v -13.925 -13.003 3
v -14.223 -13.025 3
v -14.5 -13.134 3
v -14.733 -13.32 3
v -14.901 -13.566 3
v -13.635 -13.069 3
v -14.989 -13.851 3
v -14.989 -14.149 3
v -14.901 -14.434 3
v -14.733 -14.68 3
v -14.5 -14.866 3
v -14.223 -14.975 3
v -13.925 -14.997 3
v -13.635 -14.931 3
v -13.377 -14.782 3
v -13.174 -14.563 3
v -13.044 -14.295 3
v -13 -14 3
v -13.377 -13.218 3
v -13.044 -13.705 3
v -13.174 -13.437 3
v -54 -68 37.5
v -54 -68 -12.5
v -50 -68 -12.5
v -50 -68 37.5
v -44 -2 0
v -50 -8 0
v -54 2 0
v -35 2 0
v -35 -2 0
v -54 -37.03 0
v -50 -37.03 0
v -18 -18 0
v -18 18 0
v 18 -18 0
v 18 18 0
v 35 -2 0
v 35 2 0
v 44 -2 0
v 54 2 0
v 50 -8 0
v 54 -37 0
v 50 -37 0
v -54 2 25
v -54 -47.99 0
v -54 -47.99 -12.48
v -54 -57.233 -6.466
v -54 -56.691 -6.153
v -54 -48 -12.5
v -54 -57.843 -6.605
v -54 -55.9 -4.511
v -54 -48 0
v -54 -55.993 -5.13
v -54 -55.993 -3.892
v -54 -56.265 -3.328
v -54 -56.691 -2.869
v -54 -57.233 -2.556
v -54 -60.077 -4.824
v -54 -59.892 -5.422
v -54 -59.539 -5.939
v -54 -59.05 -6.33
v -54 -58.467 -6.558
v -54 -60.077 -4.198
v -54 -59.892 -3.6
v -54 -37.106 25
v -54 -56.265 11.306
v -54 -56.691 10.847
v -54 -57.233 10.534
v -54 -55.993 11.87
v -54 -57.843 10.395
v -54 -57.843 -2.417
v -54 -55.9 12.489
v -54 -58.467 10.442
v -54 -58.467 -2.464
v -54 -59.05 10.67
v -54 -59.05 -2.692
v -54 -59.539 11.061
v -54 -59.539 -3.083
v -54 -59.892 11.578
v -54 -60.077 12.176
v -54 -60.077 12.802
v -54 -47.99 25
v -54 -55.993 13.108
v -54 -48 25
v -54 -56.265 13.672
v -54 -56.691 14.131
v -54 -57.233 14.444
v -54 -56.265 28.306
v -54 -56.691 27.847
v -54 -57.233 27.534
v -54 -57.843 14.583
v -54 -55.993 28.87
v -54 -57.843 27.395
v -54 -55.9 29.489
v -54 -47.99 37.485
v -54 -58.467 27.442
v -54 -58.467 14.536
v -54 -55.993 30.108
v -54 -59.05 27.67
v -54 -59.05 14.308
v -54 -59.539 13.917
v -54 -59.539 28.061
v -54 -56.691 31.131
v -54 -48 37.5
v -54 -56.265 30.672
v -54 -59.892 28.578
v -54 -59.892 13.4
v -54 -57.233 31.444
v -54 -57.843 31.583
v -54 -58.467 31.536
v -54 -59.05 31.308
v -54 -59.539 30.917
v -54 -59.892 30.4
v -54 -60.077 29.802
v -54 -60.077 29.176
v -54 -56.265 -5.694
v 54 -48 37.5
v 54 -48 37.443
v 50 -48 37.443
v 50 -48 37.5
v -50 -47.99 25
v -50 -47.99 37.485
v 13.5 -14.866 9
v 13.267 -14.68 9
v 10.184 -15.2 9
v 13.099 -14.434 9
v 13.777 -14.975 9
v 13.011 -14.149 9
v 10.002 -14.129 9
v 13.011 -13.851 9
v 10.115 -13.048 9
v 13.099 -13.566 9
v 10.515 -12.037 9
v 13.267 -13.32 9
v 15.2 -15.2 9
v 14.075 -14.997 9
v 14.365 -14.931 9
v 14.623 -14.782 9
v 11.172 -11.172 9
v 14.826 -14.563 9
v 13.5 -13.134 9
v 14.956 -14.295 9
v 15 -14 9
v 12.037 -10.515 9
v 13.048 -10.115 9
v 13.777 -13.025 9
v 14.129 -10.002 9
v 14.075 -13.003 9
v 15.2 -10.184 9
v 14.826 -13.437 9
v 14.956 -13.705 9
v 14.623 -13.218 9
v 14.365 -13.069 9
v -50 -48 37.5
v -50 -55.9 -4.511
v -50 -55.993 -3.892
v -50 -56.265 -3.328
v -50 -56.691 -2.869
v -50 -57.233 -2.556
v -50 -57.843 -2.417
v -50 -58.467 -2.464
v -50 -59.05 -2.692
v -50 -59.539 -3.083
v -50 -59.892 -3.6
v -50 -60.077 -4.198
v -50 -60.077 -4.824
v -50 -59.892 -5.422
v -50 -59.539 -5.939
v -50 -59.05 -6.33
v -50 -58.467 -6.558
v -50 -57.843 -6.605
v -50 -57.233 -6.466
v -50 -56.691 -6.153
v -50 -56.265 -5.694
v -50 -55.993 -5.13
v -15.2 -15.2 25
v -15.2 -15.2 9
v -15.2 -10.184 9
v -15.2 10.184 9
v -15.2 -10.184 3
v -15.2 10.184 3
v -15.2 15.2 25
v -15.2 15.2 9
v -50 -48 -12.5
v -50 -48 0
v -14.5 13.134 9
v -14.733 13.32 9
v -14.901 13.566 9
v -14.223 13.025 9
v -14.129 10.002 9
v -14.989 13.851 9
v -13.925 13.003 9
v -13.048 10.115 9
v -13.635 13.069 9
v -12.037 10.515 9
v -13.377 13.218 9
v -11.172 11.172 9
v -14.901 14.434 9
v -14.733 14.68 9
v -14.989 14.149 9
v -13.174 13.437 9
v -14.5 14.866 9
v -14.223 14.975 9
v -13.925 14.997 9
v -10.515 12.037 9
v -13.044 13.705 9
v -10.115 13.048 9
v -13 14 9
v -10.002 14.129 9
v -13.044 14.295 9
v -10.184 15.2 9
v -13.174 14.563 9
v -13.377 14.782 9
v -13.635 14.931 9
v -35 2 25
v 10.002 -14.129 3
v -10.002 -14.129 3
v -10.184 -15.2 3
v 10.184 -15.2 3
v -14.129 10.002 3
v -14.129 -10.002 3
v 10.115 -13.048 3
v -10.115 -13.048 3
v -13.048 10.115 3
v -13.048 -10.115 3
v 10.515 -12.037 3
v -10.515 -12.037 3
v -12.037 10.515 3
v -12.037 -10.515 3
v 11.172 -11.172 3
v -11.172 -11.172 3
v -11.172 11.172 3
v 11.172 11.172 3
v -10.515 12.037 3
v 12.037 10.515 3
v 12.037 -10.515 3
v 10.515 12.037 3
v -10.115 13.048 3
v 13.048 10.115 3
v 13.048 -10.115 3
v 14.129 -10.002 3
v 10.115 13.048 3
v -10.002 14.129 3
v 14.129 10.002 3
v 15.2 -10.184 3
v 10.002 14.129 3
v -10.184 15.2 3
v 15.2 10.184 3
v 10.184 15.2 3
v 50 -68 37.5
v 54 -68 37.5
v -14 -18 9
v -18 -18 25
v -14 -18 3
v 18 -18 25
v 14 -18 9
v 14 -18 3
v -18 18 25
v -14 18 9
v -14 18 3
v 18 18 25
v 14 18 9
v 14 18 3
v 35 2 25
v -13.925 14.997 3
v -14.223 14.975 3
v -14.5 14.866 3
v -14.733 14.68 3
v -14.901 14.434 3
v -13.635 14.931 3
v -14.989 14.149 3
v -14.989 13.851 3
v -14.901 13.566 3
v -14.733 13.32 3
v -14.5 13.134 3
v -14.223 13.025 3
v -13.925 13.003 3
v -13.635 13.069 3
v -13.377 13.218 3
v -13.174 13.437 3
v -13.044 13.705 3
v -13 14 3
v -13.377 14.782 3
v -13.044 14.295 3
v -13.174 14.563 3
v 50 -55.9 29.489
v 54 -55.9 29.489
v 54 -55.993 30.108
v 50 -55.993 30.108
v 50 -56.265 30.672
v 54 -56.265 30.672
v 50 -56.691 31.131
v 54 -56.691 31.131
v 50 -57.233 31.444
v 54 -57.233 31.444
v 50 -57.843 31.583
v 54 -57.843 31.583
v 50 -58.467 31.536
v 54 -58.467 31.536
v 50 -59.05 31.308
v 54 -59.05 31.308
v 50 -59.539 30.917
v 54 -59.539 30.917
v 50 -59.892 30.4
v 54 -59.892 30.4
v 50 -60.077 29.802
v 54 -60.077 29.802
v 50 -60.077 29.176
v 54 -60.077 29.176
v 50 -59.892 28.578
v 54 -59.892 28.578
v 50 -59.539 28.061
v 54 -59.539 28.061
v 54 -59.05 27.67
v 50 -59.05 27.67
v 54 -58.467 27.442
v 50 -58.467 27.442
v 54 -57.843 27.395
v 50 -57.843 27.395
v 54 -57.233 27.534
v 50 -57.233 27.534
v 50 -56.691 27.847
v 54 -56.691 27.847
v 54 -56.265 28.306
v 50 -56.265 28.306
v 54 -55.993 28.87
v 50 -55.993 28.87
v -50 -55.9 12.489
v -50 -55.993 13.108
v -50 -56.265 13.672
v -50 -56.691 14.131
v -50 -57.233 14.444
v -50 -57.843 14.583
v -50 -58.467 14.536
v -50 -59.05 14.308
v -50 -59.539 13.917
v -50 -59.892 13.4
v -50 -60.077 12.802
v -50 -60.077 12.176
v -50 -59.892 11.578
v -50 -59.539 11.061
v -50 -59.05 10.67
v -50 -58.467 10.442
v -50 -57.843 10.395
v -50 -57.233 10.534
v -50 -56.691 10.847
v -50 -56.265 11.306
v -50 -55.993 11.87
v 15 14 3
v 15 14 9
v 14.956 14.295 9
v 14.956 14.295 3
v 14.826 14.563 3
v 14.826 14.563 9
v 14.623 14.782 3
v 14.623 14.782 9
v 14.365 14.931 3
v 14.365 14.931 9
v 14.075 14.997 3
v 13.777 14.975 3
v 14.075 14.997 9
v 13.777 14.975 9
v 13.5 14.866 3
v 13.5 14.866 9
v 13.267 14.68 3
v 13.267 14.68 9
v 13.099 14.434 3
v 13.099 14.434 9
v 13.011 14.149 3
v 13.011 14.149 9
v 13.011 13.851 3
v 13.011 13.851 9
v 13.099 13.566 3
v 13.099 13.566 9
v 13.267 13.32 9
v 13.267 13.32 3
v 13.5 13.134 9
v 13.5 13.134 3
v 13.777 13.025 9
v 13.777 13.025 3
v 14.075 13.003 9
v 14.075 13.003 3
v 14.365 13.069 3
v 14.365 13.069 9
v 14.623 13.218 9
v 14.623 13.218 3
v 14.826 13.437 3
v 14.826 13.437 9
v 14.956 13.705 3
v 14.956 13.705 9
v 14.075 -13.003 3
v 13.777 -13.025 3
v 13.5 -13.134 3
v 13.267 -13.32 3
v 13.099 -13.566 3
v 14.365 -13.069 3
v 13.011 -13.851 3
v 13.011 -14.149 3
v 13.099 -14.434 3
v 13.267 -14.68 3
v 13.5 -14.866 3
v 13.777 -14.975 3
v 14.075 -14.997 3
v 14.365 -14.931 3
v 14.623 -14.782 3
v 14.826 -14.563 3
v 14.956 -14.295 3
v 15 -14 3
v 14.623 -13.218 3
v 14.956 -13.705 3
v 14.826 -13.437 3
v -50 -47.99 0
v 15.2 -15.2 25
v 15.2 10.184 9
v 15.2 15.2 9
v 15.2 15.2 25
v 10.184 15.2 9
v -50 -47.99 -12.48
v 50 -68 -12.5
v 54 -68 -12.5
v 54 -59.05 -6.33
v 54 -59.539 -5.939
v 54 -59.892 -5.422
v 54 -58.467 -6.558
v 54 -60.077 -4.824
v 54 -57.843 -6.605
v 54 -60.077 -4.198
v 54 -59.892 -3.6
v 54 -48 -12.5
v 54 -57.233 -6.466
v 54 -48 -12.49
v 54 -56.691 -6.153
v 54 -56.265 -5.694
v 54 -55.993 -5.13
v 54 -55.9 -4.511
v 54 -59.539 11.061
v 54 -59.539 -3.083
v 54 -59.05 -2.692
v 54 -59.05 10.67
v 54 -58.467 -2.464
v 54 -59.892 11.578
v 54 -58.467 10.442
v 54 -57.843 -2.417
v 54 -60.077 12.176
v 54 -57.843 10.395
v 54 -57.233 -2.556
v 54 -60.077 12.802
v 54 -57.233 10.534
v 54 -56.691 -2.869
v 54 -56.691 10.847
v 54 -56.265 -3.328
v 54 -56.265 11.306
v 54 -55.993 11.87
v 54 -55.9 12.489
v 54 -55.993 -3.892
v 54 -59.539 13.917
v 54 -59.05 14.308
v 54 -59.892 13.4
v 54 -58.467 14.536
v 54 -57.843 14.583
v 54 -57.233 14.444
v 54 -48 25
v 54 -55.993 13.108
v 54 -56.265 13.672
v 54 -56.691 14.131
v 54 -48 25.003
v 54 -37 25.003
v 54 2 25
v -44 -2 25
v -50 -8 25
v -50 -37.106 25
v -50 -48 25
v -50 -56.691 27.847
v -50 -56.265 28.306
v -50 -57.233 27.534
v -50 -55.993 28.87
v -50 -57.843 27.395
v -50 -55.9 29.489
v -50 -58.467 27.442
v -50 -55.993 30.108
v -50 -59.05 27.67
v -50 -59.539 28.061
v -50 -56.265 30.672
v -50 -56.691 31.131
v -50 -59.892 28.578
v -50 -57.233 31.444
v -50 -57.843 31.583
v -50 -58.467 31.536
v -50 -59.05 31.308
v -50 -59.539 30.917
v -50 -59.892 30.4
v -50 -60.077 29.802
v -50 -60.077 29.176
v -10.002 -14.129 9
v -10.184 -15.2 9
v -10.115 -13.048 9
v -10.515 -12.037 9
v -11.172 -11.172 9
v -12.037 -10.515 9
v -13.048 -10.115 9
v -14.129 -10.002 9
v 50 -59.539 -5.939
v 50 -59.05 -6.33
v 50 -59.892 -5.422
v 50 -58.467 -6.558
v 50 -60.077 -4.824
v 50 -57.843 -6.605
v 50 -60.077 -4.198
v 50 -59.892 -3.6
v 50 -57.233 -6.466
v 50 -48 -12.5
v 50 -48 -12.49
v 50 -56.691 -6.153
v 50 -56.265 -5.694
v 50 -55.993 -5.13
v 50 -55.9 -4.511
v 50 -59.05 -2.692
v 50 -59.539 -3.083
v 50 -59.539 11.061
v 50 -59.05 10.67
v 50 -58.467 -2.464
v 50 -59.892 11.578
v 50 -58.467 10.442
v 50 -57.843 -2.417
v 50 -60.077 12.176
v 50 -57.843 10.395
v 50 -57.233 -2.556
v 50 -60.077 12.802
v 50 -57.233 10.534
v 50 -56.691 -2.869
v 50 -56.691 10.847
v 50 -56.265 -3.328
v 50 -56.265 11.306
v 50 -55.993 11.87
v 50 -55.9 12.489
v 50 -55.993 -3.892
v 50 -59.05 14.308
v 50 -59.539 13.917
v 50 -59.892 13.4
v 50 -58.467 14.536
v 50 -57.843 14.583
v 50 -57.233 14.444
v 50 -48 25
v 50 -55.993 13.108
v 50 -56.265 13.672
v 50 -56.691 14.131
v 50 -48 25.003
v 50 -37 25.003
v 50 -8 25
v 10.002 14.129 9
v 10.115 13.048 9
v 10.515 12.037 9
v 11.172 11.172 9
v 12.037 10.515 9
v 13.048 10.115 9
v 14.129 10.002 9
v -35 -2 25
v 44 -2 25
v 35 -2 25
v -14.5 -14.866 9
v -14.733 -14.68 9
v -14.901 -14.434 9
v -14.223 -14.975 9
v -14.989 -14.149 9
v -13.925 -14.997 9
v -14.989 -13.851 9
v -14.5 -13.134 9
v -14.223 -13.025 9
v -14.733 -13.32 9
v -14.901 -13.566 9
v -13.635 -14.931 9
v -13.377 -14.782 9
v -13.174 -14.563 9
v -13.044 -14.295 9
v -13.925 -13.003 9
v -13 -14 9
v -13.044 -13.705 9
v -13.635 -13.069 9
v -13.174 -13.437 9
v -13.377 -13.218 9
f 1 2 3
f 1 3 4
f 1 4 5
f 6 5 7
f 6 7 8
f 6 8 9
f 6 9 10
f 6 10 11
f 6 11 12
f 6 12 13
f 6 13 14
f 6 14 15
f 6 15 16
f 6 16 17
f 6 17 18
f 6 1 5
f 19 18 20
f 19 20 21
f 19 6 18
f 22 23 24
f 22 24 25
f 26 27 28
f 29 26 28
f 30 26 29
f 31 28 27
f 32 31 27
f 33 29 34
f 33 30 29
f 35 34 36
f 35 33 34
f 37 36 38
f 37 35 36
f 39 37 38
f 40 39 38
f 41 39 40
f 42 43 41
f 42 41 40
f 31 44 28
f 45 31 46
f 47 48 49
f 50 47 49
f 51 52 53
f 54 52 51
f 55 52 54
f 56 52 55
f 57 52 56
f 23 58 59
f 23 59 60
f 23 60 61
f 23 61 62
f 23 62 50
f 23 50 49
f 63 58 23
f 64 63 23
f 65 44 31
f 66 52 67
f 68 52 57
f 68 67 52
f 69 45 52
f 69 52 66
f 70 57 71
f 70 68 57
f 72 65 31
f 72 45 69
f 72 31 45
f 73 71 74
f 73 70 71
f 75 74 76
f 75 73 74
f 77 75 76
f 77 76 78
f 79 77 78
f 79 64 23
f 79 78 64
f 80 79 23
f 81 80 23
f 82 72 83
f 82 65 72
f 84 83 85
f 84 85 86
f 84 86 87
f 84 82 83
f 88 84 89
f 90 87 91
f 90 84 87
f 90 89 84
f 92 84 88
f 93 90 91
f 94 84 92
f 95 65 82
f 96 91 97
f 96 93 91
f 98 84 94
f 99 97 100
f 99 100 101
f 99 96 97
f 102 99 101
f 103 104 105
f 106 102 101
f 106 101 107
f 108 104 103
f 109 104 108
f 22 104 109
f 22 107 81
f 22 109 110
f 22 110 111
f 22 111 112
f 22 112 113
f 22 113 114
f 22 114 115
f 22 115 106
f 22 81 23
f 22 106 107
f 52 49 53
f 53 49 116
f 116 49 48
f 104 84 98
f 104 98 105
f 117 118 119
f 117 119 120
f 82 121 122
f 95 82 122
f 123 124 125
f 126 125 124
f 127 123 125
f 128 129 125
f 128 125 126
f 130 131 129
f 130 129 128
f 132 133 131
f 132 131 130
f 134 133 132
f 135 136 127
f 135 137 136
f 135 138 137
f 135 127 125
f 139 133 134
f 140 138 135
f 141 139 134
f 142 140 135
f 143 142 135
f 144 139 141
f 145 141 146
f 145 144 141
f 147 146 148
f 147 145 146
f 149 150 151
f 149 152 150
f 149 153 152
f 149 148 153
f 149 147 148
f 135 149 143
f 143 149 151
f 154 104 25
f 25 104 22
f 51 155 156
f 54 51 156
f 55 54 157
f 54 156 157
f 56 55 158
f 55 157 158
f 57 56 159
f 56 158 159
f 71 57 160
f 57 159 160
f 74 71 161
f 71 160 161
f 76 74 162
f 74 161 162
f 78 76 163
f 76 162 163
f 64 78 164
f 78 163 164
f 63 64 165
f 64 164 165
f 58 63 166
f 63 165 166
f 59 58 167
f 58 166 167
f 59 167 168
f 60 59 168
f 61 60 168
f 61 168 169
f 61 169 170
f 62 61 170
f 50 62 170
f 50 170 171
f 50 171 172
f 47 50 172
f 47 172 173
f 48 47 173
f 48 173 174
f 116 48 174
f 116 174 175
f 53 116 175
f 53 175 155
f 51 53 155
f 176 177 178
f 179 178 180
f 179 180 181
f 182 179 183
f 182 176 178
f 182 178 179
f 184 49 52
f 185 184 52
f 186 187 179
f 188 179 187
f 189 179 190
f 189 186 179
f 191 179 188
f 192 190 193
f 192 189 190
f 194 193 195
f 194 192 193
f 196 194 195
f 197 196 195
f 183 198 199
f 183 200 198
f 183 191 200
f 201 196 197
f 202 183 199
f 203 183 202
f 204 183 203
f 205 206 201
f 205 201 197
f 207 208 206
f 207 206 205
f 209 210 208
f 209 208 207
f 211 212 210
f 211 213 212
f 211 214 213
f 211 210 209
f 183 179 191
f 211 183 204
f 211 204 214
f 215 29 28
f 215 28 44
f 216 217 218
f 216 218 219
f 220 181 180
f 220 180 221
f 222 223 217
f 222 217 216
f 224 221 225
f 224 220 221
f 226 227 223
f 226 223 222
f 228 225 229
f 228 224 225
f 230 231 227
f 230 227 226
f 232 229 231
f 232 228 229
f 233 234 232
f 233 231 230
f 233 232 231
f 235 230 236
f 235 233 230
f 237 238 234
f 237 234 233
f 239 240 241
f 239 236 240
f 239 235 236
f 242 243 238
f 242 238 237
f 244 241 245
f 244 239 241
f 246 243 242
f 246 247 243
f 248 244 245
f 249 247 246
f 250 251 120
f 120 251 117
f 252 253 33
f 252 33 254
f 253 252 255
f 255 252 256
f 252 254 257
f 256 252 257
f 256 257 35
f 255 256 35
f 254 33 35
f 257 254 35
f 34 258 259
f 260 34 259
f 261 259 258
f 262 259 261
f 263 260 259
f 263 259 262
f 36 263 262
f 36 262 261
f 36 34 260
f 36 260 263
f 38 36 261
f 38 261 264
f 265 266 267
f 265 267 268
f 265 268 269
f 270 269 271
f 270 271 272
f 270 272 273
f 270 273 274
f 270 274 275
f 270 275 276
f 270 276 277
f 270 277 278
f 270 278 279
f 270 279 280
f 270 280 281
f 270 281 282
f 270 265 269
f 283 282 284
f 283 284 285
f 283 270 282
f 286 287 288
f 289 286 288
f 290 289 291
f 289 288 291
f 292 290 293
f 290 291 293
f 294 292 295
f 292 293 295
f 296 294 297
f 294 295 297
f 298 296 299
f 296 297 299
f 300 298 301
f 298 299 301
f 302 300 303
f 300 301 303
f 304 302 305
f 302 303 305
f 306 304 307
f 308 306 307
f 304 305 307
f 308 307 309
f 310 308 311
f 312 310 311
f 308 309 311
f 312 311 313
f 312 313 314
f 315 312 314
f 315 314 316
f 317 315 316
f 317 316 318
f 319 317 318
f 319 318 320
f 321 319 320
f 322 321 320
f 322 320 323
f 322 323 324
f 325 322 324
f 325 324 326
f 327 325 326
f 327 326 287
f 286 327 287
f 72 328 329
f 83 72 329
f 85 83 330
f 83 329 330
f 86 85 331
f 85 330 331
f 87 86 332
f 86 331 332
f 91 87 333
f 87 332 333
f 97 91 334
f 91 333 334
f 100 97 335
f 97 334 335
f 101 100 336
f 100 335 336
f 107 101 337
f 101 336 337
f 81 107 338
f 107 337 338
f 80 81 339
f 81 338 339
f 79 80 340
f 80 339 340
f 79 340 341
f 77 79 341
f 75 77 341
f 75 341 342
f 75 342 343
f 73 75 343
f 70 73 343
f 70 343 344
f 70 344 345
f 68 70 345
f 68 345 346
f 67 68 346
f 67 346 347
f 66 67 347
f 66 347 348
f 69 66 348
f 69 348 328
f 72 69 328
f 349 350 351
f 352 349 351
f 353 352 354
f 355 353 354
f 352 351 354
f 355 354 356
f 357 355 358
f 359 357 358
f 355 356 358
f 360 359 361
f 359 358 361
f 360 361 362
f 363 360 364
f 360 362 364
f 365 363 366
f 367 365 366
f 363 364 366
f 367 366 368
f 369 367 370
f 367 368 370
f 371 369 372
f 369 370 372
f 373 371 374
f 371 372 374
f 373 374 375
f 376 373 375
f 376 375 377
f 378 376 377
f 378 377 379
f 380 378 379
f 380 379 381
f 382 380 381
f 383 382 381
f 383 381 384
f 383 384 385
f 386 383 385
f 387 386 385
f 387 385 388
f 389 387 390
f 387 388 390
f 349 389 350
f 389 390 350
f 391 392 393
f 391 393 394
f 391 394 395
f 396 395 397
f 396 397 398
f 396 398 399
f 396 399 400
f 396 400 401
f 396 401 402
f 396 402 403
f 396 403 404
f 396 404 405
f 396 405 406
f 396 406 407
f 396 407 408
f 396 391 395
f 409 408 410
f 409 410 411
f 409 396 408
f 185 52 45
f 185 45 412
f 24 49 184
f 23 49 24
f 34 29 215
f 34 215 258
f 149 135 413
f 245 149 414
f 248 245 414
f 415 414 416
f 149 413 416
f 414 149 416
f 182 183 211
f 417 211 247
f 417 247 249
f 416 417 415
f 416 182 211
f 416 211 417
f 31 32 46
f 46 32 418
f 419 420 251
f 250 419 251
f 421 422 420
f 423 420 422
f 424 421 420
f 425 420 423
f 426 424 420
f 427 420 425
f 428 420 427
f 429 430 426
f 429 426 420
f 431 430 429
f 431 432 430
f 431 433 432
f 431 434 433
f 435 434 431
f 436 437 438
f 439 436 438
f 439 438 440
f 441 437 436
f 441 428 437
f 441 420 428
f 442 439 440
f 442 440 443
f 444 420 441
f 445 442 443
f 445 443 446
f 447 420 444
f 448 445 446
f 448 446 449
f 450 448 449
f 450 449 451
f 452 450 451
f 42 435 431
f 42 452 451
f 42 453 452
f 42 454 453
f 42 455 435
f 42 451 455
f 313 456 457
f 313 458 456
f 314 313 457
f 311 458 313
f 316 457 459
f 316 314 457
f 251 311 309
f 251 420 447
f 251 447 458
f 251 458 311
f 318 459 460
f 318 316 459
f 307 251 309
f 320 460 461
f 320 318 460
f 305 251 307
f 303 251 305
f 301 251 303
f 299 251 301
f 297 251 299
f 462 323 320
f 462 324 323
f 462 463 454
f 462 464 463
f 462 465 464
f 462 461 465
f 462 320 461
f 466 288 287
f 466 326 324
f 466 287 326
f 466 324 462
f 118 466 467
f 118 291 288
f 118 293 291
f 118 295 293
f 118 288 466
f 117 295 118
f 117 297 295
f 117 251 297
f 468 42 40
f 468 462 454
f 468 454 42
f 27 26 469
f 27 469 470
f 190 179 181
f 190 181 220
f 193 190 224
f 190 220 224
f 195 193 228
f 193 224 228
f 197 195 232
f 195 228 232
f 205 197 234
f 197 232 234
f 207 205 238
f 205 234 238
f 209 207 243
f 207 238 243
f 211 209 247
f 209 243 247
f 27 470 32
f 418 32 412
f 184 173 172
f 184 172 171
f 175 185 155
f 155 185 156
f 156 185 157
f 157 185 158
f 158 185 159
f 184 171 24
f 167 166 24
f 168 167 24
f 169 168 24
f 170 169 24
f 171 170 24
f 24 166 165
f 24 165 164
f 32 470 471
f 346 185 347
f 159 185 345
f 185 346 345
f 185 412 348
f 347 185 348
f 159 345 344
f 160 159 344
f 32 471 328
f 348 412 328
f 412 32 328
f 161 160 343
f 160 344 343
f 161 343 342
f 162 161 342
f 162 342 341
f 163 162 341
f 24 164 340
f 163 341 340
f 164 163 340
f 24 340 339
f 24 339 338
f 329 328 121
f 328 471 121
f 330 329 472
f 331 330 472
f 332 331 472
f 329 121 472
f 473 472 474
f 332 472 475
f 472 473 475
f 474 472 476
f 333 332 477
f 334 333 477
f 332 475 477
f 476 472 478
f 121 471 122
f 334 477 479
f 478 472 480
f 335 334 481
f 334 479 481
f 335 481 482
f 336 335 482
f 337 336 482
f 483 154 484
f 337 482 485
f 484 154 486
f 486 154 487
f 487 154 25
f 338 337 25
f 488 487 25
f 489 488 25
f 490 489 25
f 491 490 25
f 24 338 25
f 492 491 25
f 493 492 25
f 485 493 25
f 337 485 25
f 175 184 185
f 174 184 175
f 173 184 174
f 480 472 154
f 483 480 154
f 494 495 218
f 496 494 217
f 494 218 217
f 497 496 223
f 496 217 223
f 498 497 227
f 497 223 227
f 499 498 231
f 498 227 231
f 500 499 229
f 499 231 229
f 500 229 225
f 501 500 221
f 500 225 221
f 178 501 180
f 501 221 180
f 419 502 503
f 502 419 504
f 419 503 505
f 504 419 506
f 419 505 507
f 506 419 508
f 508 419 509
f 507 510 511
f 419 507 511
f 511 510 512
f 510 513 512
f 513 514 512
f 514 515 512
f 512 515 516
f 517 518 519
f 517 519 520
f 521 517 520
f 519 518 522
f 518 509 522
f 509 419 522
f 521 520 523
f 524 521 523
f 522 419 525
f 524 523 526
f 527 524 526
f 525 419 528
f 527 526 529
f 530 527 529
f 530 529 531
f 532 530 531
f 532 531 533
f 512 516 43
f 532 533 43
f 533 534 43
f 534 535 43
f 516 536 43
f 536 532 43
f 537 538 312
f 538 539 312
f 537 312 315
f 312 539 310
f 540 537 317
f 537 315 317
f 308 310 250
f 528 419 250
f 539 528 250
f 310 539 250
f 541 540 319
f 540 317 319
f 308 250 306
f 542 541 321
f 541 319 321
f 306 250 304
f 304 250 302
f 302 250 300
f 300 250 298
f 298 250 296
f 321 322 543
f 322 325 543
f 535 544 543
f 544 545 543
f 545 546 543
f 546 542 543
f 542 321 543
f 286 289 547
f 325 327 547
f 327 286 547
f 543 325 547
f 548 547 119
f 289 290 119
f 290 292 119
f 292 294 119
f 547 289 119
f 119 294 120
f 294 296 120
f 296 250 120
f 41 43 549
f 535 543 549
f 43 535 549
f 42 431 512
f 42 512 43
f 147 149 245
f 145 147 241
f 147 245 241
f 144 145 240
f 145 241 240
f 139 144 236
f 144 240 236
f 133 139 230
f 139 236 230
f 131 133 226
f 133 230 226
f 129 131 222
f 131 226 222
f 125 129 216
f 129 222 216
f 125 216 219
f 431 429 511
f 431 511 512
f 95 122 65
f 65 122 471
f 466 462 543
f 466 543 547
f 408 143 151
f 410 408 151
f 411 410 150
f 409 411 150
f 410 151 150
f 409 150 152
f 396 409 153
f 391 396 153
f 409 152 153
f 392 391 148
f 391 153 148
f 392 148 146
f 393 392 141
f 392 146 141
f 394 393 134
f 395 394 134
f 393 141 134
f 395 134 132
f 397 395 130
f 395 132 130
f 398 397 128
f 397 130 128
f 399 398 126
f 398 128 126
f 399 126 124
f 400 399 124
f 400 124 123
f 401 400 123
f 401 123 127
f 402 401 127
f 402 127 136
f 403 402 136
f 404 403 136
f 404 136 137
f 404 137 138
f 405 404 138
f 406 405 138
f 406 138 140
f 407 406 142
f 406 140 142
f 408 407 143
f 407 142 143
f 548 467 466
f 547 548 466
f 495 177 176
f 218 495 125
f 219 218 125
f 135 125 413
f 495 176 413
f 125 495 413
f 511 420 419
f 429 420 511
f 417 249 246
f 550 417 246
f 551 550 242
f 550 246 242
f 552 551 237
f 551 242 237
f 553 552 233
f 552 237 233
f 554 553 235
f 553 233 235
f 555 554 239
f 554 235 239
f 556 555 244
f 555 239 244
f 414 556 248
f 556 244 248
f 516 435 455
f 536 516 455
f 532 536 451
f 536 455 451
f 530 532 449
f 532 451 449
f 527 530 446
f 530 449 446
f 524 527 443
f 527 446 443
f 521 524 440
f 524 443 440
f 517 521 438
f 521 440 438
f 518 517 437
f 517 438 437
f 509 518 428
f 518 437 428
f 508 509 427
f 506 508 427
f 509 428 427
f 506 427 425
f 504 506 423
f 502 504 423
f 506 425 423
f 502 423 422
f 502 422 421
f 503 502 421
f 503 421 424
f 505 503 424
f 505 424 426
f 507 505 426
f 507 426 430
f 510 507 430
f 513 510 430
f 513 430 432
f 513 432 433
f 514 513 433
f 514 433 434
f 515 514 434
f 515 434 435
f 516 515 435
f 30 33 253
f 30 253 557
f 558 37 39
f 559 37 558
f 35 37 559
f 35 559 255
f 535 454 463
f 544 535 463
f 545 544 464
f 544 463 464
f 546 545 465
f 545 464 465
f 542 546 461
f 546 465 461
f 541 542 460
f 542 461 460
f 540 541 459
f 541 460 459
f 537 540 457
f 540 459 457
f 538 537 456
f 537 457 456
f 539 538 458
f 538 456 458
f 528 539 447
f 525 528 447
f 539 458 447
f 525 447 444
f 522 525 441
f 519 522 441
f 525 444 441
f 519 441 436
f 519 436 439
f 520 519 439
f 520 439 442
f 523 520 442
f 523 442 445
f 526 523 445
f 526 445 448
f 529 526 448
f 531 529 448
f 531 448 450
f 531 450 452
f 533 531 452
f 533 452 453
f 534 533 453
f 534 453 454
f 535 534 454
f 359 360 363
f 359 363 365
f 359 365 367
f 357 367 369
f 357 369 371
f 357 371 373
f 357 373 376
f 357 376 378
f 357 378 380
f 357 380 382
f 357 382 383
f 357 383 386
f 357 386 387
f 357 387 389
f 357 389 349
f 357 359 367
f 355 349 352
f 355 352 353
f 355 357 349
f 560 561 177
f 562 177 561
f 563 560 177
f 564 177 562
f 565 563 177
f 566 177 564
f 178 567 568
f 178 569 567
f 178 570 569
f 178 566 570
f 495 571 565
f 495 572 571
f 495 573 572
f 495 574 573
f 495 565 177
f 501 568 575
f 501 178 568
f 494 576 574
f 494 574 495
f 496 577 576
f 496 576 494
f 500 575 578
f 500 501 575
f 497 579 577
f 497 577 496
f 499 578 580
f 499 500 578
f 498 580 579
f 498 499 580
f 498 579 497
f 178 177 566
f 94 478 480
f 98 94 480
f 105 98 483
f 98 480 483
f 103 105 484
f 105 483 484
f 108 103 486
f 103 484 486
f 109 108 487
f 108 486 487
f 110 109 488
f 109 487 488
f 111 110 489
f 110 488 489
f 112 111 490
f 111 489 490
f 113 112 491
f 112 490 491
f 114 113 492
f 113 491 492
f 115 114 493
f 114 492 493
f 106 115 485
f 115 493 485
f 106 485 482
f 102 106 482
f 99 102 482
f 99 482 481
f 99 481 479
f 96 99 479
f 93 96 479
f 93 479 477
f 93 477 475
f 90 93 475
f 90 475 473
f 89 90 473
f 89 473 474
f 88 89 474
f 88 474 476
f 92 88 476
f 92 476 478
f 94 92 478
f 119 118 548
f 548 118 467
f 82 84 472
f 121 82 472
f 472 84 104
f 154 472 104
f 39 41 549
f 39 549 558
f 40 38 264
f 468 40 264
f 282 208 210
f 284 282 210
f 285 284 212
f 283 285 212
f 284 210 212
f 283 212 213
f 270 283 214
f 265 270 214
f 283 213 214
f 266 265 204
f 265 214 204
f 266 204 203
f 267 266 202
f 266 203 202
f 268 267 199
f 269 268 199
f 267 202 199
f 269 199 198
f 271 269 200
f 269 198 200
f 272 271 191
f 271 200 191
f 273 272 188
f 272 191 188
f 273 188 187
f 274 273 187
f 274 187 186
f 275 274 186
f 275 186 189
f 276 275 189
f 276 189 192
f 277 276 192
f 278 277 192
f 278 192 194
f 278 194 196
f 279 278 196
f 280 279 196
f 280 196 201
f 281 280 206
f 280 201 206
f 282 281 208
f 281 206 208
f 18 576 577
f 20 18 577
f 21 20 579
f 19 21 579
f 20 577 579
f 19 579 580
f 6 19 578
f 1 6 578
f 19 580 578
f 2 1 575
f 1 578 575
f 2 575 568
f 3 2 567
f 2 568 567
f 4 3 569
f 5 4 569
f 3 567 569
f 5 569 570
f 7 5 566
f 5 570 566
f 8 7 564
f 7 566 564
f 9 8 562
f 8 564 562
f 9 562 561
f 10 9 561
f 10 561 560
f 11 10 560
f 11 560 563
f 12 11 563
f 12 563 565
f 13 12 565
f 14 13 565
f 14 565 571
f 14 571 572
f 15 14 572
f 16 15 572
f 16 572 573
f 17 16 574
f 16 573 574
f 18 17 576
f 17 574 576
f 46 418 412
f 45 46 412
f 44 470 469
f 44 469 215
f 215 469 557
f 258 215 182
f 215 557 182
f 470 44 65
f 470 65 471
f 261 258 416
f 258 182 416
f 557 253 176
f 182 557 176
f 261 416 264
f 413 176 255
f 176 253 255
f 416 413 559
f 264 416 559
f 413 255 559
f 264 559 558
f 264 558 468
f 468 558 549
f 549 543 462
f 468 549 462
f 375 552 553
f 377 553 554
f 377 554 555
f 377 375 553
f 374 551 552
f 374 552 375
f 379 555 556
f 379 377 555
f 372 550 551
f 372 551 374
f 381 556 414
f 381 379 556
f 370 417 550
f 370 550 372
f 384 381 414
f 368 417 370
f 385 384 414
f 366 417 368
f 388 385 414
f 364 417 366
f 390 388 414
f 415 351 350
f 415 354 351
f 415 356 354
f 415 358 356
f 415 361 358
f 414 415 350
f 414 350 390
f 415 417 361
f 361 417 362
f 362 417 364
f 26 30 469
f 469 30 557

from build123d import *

# Parameters (mm, degrees)
SKETCH_W        = 36
SKETCH_H        = 36
PAD_DEPTH       = 25
SKETCH001_W     = 30.4
SKETCH001_H     = 30.4
POCKET_DEPTH    = 22
SKETCH002_R     = 4
PAD001_DEPTH    = 6
SKETCH003_R     = 1
POCKET001_DEPTH = 6
SKETCH004_W     = 4
SKETCH004_H     = 25
PAD002_DEPTH    = 32
SKETCH005_W     = 4
SKETCH005_H     = 25
PAD003_DEPTH    = 32
SKETCH006_W     = 70
SKETCH006_H     = 25
PAD004_DEPTH    = 4
SKETCH007_W     = 70
SKETCH007_H     = 25
PAD005_DEPTH    = 4
PAD006_DEPTH    = 25
PAD007_DEPTH    = 25
SKETCH010_W     = 20
SKETCH010_H     = 50
PAD008_DEPTH    = 4
SKETCH011_W     = 20
SKETCH011_H     = 50
PAD009_DEPTH    = 4
SKETCH012_R     = 2.1
POCKET002_DEPTH = 120
PAD010_DEPTH    = 4
PAD011_DEPTH    = 4


with BuildPart() as part:
    # Sketch → Pad (new body)
    with BuildSketch(Plane.XY):
        Rectangle(SKETCH_W, SKETCH_H)
    extrude(amount=PAD_DEPTH)

    # Sketch001 (on Face6 of Pad) → Pocket (cut)
    with BuildSketch(Plane.XY.offset(25)):
        Rectangle(SKETCH001_W, SKETCH001_H)
    extrude(amount=-POCKET_DEPTH, mode=Mode.SUBTRACT)

    # Sketch002 (on Face11 of Pocket) → Pad001 (join)
    with BuildSketch(Plane.XY.offset(3)):
        with Locations((-14, 14)):
            Circle(SKETCH002_R)
        with Locations((14, 14)):
            Circle(SKETCH002_R)
        with Locations((14, -14)):
            Circle(SKETCH002_R)
        with Locations((-14, -14)):
            Circle(SKETCH002_R)
    extrude(amount=PAD001_DEPTH)

    # Sketch003 (on DatumPlane) → Pocket001 (cut)
    with BuildSketch(Plane.XY.offset(9)):
        with Locations((-14, -14)):
            Circle(SKETCH003_R)
        with Locations((14, -14)):
            Circle(SKETCH003_R)
        with Locations((14, 14)):
            Circle(SKETCH003_R)
        with Locations((-14, 14)):
            Circle(SKETCH003_R)
    extrude(amount=-POCKET001_DEPTH, mode=Mode.SUBTRACT)

    # Sketch004 (on DatumPlane) → Pad002 (join)
    with BuildSketch(Plane.YZ.offset(18)):
        with Locations((0, 12.5)):
            Rectangle(SKETCH004_W, SKETCH004_H)
    extrude(amount=PAD002_DEPTH)

    # Sketch005 (on DatumPlane) → Pad003 (join)
    with BuildSketch(Plane(origin=(-18, 0, 0), x_dir=(0, -1, 0), z_dir=(-1, 0, 0))):
        with Locations((0, 12.5)):
            Rectangle(SKETCH005_W, SKETCH005_H)
    extrude(amount=PAD003_DEPTH)

    # Sketch006 (on DatumPlane) → Pad004 (join)
    with BuildSketch(Plane(origin=(-50, 0, 0), x_dir=(0, -1, 0), z_dir=(-1, 0, 0))):
        with Locations((33, 12.5)):
            Rectangle(SKETCH006_W, SKETCH006_H)
    extrude(amount=PAD004_DEPTH)

    # Sketch007 (on DatumPlane) → Pad005 (join)
    with BuildSketch(Plane.YZ.offset(50)):
        with Locations((-33, 12.5)):
            Rectangle(SKETCH007_W, SKETCH007_H)
    extrude(amount=PAD005_DEPTH)

    # Sketch008 (on DatumPlane) → Pad006 (join)
    with BuildSketch(Plane(origin=(0, 0, 0), x_dir=(1, 0, 0), z_dir=(0, 0, -1))):
        Polygon((18, 18), (18, 2), (35, 2), align=None)
        Polygon((18, -2), (18, -18), (35, -2), align=None)
        Polygon((-18, -18), (-18, -2), (-35, -2), align=None)
        Polygon((-18, 2), (-18, 18), (-35, 2), align=None)
    extrude(amount=-PAD006_DEPTH)

    # Sketch009 (on DatumPlane) → Pad007 (join)
    with BuildSketch(Plane(origin=(0, 0, 0), x_dir=(1, 0, 0), z_dir=(0, 0, -1))):
        Polygon((50, 2), (50, 8), (44, 2), align=None)
        Polygon((-50, 2), (-44, 2), (-50, 8), align=None)
    extrude(amount=-PAD007_DEPTH)

    # Sketch010 (on DatumPlane) → Pad008 (join)
    with BuildSketch(Plane.YZ.offset(54)):
        with Locations((-58, 12.5)):
            Rectangle(SKETCH010_W, SKETCH010_H)
    extrude(amount=-PAD008_DEPTH)

    # Sketch011 (on DatumPlane) → Pad009 (join)
    with BuildSketch(Plane(origin=(-54, 0, 0), x_dir=(0, -1, 0), z_dir=(-1, 0, 0))):
        with Locations((58, 12.5)):
            Rectangle(SKETCH011_W, SKETCH011_H)
    extrude(amount=-PAD009_DEPTH)

    # Sketch012 (on DatumPlane) → Pocket002 (cut)
    with BuildSketch(Plane.YZ.offset(54)):
        with Locations((-58, 29.488935)):
            Circle(SKETCH012_R)
        with Locations((-58, 12.488935)):
            Circle(SKETCH012_R)
        with Locations((-58.000031, -4.511065)):
            Circle(SKETCH012_R)
    extrude(amount=-POCKET002_DEPTH, mode=Mode.SUBTRACT)

    # Sketch013 (on DatumPlane) → Pad010 (join)
    with BuildSketch(Plane.YZ.offset(54)):
        Polygon((-48, 25.003424), (-48, 37.443424), (-37, 25.003424), align=None)
        Polygon((-48, 0), (-48, -12.489775), (-37, 0), align=None)
    extrude(amount=-PAD010_DEPTH)

    # Sketch014 (on DatumPlane) → Pad011 (join)
    with BuildSketch(Plane.YZ.offset(-50)):
        Polygon((-47.989925, 24.913122), (-47.989925, 37.485035), (-37.0298, 24.913122), align=None)
        Polygon((-47.989925, -12.480257), (-47.989925, 0), (-37.0298, 0), align=None)
    extrude(amount=-PAD011_DEPTH)


solid = part.part
